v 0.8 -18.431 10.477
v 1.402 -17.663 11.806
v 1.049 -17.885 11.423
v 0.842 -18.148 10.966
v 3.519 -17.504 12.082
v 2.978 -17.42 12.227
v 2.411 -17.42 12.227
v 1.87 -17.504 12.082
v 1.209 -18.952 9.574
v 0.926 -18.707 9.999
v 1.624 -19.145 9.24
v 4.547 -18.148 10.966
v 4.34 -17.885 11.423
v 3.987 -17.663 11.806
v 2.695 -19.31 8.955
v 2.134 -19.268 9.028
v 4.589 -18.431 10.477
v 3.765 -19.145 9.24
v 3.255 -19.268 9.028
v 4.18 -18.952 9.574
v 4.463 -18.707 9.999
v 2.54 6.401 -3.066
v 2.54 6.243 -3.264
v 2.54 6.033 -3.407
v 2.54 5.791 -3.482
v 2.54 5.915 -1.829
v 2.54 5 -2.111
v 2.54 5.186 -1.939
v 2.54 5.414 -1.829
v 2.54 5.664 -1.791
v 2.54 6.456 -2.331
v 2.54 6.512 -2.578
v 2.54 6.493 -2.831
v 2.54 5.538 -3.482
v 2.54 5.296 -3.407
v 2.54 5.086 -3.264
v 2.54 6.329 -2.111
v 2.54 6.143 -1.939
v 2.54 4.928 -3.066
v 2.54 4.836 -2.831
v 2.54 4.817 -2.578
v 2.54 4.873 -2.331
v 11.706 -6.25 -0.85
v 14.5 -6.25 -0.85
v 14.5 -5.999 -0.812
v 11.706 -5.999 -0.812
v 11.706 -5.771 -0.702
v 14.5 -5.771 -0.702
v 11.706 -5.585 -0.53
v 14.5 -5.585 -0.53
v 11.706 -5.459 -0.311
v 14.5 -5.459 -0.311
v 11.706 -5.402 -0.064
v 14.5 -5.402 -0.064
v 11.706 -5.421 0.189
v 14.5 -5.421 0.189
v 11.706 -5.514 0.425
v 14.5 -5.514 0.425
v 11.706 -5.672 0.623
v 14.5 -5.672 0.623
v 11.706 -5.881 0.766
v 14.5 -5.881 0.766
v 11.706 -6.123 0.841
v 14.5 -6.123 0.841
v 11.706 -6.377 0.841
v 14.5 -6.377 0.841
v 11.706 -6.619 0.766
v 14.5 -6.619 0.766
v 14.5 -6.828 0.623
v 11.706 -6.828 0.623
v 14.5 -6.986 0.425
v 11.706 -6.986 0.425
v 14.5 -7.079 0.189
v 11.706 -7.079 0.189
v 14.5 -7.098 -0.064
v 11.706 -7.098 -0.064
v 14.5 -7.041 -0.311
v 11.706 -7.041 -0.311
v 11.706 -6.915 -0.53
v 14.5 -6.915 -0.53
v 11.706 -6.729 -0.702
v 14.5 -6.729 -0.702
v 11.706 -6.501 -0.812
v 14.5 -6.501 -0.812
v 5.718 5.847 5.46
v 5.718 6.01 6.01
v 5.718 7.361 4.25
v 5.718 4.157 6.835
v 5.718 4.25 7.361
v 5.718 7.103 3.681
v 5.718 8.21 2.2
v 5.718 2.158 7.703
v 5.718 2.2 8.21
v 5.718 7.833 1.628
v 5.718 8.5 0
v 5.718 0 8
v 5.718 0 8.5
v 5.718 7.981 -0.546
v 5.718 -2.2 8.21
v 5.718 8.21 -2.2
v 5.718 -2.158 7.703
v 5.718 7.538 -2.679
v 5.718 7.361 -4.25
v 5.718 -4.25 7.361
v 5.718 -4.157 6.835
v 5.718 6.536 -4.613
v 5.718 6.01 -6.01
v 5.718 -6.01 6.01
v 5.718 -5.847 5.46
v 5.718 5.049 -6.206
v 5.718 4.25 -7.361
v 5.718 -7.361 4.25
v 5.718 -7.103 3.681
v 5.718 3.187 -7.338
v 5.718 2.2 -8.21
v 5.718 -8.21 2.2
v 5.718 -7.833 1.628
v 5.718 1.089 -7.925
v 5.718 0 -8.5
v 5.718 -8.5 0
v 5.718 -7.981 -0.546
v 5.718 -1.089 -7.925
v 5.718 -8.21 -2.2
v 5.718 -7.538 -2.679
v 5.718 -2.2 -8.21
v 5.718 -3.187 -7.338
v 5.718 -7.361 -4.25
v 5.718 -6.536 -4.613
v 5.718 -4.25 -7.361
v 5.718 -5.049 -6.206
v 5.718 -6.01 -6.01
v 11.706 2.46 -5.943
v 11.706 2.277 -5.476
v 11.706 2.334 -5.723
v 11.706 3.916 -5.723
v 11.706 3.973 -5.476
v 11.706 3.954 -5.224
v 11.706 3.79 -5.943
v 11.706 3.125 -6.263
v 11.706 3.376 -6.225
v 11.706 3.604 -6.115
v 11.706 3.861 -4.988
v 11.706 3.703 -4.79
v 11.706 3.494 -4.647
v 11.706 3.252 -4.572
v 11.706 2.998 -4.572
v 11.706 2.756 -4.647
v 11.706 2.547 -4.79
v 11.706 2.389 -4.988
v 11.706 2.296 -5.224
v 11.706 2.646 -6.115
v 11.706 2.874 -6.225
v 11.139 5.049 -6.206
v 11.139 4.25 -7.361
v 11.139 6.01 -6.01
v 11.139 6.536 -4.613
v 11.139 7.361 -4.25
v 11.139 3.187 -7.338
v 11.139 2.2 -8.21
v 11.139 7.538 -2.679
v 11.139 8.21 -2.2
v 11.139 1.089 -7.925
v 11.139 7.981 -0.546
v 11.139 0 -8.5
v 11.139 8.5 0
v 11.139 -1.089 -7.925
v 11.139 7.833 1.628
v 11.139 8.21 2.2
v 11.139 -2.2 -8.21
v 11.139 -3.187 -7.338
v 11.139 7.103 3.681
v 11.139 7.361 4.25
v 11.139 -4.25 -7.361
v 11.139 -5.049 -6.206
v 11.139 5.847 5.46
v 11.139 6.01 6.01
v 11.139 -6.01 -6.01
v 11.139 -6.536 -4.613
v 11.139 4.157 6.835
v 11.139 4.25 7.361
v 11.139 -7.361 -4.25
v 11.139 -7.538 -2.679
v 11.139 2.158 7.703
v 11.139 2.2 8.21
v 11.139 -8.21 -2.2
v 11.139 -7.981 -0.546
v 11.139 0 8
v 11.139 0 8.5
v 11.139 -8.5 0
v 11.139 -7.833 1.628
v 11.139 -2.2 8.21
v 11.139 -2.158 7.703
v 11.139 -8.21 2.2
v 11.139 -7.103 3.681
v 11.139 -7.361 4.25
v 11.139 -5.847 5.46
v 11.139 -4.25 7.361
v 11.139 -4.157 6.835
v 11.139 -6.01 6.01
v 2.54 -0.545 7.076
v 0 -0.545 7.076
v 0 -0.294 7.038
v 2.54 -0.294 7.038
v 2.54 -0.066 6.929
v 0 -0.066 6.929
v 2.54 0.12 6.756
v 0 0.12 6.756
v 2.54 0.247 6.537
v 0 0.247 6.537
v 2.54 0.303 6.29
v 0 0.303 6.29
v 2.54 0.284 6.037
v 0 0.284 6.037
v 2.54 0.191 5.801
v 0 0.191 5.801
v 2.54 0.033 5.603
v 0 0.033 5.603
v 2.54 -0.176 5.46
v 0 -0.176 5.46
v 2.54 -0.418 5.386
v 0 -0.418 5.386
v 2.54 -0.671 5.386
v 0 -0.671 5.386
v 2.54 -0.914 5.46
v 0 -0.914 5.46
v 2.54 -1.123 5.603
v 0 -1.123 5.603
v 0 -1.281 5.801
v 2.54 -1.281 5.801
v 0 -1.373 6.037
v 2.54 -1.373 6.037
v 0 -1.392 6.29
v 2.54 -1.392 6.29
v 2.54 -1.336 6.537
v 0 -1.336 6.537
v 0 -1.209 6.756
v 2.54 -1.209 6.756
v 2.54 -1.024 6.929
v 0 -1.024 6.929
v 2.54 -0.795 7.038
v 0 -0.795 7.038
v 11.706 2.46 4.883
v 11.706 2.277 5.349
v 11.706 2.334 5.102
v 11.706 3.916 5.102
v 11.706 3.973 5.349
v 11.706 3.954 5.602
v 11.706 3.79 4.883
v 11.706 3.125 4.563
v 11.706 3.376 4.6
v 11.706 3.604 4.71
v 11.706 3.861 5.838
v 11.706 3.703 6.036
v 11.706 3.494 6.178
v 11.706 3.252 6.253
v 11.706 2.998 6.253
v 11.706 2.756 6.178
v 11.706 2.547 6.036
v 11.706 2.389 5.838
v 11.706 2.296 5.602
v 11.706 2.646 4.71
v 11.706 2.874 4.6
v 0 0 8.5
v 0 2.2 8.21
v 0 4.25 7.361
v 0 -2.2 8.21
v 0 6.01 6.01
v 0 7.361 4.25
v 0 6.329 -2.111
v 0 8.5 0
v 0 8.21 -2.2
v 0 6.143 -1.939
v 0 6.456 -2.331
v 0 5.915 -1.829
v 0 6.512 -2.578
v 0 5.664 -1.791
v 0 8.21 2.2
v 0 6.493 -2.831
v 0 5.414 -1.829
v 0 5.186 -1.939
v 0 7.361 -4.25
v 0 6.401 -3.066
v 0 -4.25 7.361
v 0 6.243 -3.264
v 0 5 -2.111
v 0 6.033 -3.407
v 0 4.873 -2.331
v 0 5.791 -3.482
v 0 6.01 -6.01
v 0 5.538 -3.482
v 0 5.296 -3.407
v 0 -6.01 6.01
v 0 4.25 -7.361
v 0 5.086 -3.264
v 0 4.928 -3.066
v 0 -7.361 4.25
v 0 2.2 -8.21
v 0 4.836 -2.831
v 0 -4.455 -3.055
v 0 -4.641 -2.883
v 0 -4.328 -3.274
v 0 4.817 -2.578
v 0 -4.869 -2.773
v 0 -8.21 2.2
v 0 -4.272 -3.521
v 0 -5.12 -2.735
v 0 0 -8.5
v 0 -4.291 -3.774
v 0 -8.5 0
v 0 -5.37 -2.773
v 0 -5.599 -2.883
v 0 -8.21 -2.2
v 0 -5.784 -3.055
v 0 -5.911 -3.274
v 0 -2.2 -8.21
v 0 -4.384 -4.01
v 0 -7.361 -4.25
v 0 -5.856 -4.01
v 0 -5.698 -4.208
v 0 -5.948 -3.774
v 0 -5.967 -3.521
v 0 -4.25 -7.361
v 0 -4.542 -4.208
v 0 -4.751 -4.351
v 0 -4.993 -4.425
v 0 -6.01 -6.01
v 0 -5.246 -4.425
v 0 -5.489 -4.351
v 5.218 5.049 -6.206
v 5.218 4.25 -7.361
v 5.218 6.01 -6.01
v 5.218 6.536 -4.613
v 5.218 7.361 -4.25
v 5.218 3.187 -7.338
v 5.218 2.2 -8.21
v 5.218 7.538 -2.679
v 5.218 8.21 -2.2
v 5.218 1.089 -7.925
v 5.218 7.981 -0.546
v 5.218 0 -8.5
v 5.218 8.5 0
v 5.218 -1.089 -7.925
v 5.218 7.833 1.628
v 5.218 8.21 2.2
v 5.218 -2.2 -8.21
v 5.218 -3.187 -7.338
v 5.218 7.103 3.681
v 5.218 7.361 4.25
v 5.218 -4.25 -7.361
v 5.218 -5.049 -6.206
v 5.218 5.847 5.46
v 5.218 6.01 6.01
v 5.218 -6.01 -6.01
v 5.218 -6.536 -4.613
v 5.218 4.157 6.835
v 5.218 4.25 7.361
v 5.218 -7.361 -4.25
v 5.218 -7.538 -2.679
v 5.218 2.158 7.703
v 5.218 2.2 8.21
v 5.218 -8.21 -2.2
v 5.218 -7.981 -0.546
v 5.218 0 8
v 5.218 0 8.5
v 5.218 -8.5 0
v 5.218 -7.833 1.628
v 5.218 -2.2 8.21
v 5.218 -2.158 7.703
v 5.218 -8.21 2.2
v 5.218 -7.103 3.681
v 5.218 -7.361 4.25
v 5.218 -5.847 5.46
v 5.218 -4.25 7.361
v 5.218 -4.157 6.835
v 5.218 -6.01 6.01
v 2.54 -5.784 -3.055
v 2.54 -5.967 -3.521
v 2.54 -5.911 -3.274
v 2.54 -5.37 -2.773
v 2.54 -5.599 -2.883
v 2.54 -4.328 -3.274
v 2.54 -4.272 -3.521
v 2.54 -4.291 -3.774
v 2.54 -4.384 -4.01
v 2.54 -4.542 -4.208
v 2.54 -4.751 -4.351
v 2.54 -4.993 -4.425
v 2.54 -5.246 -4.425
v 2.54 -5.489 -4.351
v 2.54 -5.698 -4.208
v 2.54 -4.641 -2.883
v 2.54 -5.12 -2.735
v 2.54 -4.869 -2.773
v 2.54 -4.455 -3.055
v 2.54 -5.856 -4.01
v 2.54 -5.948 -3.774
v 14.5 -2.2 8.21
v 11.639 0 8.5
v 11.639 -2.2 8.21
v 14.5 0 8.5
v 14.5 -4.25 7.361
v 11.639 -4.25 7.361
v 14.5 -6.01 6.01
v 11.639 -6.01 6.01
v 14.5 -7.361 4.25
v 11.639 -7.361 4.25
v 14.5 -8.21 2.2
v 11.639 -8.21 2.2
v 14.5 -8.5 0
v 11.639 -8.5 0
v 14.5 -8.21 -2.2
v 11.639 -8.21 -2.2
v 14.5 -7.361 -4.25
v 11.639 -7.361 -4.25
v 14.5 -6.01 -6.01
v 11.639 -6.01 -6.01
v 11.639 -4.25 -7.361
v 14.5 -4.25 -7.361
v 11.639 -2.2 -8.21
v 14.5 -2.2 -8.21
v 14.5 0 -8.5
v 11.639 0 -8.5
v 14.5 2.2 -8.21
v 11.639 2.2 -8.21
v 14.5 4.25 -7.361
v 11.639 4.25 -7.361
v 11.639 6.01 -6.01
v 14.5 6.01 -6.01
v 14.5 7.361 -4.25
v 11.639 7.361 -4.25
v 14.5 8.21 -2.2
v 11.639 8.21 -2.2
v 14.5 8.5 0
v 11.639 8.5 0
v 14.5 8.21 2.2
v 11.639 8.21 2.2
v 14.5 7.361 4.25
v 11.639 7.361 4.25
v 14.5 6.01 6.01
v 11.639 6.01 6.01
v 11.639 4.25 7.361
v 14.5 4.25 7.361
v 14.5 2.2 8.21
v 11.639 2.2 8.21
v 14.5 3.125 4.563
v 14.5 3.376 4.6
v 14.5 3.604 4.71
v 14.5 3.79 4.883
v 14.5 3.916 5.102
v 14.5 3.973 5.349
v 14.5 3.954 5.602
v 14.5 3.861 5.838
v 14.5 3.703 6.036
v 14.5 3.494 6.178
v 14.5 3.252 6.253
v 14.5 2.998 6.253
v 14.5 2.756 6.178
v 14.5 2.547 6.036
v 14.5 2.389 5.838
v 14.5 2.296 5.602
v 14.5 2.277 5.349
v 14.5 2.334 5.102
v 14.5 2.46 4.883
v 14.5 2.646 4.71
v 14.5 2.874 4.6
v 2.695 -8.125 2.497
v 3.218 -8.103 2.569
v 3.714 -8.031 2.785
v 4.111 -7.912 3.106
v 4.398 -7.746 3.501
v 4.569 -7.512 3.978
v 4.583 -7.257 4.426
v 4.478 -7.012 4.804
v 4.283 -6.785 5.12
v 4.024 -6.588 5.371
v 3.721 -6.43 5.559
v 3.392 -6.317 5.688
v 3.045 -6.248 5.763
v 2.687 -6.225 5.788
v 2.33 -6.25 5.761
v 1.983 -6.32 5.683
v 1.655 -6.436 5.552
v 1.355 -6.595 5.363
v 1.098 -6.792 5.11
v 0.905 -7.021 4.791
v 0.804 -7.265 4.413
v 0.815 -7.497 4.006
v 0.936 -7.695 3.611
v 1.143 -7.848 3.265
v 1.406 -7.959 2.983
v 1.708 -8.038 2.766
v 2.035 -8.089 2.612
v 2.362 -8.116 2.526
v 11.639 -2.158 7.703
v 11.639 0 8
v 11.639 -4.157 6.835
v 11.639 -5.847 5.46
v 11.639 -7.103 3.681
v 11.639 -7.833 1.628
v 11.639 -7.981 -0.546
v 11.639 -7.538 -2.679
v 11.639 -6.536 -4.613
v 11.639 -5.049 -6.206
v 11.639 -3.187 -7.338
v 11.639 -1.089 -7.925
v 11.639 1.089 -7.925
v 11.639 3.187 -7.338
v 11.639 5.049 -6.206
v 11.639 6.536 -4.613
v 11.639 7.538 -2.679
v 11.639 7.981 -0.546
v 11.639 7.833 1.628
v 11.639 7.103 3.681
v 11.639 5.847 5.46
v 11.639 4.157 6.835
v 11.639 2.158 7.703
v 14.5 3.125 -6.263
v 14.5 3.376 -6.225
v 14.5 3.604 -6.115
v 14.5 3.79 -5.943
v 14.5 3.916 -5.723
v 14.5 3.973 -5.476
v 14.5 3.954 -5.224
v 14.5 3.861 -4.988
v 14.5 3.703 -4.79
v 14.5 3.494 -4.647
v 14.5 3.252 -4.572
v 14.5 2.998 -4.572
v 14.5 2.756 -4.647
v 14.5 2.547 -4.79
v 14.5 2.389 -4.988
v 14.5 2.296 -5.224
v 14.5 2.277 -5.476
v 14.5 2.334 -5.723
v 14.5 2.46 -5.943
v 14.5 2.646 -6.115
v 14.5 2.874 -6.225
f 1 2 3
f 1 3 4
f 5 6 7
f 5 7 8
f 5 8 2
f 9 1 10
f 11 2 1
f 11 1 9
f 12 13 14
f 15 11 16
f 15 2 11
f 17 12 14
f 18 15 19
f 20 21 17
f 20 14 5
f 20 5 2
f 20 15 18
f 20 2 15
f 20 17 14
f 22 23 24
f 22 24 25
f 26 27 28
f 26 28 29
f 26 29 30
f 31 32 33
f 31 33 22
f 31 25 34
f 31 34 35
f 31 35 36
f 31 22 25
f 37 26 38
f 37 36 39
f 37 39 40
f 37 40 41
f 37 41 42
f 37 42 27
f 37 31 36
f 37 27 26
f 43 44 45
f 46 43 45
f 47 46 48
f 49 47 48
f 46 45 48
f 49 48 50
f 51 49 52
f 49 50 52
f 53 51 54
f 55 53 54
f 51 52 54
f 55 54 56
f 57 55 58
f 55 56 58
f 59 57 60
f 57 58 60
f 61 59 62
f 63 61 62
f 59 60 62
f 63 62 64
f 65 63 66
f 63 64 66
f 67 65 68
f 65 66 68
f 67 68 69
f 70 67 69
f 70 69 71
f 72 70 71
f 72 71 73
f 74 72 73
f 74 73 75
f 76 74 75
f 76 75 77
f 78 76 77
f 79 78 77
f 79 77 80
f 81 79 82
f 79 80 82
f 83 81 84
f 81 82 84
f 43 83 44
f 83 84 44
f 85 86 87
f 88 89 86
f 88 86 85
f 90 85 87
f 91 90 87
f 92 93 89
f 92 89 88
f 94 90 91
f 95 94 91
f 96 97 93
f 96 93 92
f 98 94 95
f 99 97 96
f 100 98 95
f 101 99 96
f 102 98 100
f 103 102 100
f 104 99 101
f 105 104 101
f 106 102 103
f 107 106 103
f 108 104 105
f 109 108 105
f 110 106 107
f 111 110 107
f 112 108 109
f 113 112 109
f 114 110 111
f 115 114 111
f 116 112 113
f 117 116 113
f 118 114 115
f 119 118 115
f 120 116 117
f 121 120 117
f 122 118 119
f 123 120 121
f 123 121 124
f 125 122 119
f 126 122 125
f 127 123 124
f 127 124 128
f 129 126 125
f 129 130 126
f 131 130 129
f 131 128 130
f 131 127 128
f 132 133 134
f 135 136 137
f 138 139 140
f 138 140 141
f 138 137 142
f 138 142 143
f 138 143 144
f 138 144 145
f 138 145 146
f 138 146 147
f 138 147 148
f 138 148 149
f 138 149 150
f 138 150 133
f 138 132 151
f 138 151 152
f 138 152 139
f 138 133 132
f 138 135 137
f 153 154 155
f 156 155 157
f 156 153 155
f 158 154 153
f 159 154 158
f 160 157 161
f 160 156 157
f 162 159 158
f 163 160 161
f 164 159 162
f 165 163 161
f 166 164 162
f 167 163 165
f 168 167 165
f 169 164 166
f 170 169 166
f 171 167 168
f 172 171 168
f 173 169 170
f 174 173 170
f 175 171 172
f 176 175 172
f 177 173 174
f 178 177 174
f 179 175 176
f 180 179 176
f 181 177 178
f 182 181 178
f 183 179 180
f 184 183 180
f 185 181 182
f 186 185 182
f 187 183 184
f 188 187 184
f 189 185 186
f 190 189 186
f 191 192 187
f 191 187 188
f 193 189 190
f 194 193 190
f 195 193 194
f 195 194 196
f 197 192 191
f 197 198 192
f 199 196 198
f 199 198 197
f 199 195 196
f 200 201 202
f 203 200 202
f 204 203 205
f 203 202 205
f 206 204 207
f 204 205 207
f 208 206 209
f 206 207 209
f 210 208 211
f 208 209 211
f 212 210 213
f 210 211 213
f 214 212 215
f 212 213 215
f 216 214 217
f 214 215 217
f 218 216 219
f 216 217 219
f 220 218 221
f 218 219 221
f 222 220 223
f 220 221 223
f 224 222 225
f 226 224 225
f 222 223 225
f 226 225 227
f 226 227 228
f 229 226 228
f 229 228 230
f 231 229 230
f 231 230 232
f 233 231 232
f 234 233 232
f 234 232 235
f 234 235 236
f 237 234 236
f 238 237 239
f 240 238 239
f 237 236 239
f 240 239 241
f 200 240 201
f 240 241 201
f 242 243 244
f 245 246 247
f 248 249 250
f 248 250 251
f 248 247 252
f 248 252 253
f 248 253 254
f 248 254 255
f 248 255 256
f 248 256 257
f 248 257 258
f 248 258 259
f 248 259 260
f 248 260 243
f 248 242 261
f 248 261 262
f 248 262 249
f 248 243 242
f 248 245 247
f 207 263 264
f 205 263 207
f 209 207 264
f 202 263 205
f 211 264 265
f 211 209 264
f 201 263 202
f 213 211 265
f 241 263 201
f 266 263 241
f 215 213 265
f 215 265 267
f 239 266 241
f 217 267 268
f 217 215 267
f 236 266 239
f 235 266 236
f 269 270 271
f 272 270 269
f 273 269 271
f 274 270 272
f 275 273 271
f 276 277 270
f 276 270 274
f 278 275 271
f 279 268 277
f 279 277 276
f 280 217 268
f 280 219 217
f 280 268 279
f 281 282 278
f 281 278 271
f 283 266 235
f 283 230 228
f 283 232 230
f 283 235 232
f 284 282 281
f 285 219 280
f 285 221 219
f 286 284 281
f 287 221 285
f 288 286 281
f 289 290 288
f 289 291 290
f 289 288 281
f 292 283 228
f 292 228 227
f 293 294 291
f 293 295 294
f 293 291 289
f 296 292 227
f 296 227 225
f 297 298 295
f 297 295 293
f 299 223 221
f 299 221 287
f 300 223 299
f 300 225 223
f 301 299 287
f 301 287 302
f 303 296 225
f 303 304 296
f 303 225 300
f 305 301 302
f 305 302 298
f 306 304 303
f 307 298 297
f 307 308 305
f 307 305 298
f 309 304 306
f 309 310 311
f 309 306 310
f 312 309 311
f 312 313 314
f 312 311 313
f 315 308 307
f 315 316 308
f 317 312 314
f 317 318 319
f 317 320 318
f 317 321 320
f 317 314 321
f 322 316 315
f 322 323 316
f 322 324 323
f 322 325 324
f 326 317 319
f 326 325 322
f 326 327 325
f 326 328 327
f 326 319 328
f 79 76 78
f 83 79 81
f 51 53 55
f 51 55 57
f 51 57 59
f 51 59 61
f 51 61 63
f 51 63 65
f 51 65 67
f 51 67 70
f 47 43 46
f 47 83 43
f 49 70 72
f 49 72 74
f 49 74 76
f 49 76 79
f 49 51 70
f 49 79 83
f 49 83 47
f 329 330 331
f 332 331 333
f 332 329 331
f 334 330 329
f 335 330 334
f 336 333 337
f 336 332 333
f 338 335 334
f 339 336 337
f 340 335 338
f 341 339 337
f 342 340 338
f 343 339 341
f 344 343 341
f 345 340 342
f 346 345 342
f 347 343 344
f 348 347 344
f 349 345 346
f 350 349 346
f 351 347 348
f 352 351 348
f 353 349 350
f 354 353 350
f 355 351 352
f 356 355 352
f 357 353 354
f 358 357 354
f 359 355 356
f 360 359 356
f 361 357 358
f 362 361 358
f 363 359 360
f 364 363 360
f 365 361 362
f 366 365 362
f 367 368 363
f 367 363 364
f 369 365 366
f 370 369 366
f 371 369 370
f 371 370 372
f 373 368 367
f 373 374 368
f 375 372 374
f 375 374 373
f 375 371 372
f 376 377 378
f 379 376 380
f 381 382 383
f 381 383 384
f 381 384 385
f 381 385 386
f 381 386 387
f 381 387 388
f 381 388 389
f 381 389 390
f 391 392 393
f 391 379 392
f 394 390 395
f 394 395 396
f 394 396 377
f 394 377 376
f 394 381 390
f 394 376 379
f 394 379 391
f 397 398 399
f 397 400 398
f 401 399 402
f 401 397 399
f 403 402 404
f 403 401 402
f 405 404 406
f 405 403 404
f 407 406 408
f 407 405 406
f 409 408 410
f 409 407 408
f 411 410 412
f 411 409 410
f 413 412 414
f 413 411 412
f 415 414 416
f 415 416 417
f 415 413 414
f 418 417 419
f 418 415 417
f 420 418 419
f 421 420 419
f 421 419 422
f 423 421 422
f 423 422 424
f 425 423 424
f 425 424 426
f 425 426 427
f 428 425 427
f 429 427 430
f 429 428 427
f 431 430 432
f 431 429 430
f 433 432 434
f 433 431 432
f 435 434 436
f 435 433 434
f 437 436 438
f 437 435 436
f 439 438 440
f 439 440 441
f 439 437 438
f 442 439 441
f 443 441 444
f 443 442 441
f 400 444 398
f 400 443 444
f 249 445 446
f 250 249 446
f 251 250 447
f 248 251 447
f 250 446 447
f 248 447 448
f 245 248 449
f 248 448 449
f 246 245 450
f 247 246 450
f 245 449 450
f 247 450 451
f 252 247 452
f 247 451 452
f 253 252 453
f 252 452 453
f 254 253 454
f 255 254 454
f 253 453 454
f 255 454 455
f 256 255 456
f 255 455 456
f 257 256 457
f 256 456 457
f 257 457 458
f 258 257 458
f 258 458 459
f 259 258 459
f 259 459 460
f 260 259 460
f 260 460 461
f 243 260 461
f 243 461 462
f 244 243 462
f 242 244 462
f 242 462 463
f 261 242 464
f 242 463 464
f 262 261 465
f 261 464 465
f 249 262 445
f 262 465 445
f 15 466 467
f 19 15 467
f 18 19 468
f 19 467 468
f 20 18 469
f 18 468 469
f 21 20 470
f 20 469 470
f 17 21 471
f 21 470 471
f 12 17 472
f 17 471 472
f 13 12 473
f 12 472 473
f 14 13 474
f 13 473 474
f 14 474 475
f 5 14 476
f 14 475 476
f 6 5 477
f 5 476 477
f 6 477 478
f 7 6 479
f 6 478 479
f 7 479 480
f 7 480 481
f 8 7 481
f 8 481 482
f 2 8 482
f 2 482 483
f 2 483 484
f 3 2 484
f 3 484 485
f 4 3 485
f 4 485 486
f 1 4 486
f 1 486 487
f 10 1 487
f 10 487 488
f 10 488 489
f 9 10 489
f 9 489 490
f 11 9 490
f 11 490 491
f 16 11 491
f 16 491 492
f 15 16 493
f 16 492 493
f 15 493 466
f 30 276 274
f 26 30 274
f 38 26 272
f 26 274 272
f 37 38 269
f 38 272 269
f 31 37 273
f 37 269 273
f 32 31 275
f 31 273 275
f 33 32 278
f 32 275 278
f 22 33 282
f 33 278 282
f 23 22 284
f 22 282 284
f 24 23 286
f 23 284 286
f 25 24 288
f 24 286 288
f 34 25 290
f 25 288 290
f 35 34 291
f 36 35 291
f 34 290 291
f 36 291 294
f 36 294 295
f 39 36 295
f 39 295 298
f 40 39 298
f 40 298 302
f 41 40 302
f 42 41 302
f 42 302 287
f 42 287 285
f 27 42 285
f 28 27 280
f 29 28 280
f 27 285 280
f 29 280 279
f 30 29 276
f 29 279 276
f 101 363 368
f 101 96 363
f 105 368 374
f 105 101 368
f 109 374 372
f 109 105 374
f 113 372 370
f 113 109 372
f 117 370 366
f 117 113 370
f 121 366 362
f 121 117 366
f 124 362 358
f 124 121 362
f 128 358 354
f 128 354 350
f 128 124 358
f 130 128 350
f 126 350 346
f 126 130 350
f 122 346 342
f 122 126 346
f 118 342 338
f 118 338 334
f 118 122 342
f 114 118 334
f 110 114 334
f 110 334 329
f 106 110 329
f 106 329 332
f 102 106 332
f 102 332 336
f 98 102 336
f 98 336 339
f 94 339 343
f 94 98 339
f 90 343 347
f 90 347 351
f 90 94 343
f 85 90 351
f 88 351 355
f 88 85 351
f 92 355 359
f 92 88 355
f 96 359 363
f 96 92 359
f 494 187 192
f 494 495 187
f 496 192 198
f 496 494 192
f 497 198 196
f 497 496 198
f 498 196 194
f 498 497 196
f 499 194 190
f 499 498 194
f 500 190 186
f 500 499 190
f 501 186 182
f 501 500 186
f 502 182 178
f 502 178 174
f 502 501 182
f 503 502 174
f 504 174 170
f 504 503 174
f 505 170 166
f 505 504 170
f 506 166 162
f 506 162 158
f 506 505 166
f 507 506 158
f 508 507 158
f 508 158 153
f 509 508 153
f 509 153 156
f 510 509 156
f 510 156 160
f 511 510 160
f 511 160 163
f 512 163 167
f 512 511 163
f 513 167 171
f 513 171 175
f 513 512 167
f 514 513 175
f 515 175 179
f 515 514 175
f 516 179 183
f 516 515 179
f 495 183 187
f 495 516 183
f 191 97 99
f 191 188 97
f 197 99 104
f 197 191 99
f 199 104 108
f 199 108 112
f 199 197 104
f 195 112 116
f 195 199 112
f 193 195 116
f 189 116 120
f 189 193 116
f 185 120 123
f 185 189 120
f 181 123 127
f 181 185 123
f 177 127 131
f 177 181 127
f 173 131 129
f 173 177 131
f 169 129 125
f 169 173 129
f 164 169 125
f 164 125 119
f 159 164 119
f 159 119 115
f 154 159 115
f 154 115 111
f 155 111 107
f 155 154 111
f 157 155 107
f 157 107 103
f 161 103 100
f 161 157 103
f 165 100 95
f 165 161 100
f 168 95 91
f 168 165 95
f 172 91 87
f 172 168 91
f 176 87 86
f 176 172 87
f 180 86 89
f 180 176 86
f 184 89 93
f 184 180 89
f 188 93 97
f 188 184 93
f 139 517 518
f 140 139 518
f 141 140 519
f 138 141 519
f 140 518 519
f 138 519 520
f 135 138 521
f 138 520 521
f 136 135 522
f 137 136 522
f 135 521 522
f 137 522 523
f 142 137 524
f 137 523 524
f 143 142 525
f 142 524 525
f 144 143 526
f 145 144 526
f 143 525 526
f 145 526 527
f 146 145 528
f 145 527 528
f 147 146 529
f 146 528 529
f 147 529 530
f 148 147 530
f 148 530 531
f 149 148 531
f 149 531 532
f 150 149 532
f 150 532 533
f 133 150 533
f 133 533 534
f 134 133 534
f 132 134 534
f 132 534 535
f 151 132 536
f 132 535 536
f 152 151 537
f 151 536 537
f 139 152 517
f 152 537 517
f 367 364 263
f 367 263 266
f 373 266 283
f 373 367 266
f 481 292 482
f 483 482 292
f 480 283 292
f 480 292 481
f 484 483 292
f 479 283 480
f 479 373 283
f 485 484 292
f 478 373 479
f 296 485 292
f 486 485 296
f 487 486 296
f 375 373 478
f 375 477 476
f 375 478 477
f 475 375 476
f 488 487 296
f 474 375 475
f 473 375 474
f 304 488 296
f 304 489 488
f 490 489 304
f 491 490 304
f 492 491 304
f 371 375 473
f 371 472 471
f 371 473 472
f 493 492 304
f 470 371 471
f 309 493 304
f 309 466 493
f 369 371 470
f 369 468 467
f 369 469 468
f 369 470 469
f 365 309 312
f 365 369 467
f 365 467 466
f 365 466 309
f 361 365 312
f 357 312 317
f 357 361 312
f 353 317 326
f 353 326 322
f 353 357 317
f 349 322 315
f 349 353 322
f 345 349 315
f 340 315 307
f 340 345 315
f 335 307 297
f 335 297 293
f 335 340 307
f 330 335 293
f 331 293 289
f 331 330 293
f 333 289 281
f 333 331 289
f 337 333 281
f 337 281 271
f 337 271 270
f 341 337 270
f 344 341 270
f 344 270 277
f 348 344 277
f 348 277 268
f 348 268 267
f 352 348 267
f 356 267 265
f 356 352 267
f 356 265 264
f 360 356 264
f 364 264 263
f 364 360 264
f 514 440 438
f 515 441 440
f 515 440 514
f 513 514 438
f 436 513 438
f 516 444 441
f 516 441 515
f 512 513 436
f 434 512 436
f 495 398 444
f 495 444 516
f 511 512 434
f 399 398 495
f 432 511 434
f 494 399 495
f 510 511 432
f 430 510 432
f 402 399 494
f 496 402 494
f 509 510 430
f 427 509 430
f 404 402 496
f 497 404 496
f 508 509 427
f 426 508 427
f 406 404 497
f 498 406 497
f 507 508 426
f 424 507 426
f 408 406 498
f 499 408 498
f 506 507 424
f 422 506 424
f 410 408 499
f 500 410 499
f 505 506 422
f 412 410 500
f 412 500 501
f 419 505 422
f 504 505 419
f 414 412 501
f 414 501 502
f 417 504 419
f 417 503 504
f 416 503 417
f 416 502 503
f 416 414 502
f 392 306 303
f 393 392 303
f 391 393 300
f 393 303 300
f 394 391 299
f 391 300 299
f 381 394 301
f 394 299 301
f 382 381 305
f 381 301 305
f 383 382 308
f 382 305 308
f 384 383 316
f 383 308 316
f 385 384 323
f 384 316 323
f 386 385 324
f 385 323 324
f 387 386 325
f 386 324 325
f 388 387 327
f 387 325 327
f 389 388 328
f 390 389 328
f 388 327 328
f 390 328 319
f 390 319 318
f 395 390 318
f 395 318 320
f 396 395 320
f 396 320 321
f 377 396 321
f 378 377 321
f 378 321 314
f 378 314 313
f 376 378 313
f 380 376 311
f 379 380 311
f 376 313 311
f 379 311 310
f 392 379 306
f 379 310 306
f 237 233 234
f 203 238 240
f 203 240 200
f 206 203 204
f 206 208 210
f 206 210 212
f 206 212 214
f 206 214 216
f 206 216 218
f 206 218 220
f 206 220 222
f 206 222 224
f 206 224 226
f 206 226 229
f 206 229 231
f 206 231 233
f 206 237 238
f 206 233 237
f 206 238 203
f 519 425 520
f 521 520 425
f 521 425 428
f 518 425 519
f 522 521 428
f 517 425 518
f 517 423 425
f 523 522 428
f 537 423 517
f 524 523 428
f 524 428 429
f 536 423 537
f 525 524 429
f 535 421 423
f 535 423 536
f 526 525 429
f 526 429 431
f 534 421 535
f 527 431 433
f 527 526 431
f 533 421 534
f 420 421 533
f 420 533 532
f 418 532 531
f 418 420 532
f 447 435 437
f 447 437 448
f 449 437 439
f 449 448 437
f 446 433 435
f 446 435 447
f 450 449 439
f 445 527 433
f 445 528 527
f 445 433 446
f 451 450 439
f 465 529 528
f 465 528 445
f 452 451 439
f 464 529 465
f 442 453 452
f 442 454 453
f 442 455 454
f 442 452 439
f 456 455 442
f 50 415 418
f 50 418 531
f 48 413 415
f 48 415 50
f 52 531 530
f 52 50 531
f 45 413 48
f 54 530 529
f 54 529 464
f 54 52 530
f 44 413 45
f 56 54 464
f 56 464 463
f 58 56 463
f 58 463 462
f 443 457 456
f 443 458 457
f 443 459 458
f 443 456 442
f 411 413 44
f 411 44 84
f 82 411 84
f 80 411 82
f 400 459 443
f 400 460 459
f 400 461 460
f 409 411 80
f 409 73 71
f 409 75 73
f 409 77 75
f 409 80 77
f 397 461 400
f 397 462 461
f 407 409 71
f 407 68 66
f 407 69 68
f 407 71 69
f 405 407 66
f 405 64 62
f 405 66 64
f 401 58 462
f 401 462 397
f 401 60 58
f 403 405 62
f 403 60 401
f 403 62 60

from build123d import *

# Parameters (mm, degrees)
SKETCH2_R                = 0.85
CUT_EXTRUDE1_DEPTH       = 2.54
BOSS_EXTRUDE1_DEPTH      = 12.7
BOSS_EXTRUDE1_DEPTH_BACK = 2.54
SKETCH3_R                = 1.9
SKETCH4_R                = 0.85
CUT_EXTRUDE2_DEPTH       = 2.794


with BuildPart() as part:
    # Sketch1 → Revolve1 (revolve)
    with BuildSketch(Plane.XY, mode=Mode.PRIVATE) as revolve1_sk:
        Polygon((0, 0), (0, 8.5), (5.21775571, 8.5), (5.21775571, 8), (5.71775571, 8), (5.71775571, 8.5), (11.139308543, 8.5), (11.139308543, 8), (11.639308543, 8), (11.639308543, 8.5), (14.5, 8.5), (14.5, 0), align=None)
    revolve(revolve1_sk.sketch.rotate(Axis((0, 0, 0), (1, 0, 0)), 90), axis=Axis((0, 0, 0), (1, 0, 0)))

    # Sketch2 → Cut-Extrude1 (cut)
    with BuildSketch(Plane.ZY):
        with Locations((-2.641364136, 5.664423669)):
            Circle(SKETCH2_R)
        with Locations((6.226216863, -0.544723392)):
            Circle(SKETCH2_R)
        with Locations((-3.584852727, -5.119700277)):
            Circle(SKETCH2_R)
    extrude(amount=-CUT_EXTRUDE1_DEPTH, mode=Mode.SUBTRACT)

    # Sketch3 → Boss-Extrude1 (add, two sides: drawn at the far end of the back side and taken through both)
    with BuildSketch(Plane(origin=(0, -7.361215932, 4.25), x_dir=(1, 0, 0), z_dir=(0, -0.8660254037844398, 0.499999999999998)).offset(-BOSS_EXTRUDE1_DEPTH_BACK)):
        with Locations(Location((2.694505782, 0, 0), (0, 0, 270))):
            Circle(SKETCH3_R)
    extrude(amount=BOSS_EXTRUDE1_DEPTH + BOSS_EXTRUDE1_DEPTH_BACK)

    # Sketch4 → Cut-Extrude2 (cut)
    with BuildSketch(Plane(origin=(14.5, 0, 0), x_dir=(0, 0, -1), z_dir=(1, 0, 0))):
        with Locations((0, -6.25)):
            Circle(SKETCH4_R)
        with Locations((-5.412658774, 3.125)):
            Circle(SKETCH4_R)
        with Locations((5.412658774, 3.125)):
            Circle(SKETCH4_R)
    extrude(amount=-CUT_EXTRUDE2_DEPTH, mode=Mode.SUBTRACT)


solid = part.part
